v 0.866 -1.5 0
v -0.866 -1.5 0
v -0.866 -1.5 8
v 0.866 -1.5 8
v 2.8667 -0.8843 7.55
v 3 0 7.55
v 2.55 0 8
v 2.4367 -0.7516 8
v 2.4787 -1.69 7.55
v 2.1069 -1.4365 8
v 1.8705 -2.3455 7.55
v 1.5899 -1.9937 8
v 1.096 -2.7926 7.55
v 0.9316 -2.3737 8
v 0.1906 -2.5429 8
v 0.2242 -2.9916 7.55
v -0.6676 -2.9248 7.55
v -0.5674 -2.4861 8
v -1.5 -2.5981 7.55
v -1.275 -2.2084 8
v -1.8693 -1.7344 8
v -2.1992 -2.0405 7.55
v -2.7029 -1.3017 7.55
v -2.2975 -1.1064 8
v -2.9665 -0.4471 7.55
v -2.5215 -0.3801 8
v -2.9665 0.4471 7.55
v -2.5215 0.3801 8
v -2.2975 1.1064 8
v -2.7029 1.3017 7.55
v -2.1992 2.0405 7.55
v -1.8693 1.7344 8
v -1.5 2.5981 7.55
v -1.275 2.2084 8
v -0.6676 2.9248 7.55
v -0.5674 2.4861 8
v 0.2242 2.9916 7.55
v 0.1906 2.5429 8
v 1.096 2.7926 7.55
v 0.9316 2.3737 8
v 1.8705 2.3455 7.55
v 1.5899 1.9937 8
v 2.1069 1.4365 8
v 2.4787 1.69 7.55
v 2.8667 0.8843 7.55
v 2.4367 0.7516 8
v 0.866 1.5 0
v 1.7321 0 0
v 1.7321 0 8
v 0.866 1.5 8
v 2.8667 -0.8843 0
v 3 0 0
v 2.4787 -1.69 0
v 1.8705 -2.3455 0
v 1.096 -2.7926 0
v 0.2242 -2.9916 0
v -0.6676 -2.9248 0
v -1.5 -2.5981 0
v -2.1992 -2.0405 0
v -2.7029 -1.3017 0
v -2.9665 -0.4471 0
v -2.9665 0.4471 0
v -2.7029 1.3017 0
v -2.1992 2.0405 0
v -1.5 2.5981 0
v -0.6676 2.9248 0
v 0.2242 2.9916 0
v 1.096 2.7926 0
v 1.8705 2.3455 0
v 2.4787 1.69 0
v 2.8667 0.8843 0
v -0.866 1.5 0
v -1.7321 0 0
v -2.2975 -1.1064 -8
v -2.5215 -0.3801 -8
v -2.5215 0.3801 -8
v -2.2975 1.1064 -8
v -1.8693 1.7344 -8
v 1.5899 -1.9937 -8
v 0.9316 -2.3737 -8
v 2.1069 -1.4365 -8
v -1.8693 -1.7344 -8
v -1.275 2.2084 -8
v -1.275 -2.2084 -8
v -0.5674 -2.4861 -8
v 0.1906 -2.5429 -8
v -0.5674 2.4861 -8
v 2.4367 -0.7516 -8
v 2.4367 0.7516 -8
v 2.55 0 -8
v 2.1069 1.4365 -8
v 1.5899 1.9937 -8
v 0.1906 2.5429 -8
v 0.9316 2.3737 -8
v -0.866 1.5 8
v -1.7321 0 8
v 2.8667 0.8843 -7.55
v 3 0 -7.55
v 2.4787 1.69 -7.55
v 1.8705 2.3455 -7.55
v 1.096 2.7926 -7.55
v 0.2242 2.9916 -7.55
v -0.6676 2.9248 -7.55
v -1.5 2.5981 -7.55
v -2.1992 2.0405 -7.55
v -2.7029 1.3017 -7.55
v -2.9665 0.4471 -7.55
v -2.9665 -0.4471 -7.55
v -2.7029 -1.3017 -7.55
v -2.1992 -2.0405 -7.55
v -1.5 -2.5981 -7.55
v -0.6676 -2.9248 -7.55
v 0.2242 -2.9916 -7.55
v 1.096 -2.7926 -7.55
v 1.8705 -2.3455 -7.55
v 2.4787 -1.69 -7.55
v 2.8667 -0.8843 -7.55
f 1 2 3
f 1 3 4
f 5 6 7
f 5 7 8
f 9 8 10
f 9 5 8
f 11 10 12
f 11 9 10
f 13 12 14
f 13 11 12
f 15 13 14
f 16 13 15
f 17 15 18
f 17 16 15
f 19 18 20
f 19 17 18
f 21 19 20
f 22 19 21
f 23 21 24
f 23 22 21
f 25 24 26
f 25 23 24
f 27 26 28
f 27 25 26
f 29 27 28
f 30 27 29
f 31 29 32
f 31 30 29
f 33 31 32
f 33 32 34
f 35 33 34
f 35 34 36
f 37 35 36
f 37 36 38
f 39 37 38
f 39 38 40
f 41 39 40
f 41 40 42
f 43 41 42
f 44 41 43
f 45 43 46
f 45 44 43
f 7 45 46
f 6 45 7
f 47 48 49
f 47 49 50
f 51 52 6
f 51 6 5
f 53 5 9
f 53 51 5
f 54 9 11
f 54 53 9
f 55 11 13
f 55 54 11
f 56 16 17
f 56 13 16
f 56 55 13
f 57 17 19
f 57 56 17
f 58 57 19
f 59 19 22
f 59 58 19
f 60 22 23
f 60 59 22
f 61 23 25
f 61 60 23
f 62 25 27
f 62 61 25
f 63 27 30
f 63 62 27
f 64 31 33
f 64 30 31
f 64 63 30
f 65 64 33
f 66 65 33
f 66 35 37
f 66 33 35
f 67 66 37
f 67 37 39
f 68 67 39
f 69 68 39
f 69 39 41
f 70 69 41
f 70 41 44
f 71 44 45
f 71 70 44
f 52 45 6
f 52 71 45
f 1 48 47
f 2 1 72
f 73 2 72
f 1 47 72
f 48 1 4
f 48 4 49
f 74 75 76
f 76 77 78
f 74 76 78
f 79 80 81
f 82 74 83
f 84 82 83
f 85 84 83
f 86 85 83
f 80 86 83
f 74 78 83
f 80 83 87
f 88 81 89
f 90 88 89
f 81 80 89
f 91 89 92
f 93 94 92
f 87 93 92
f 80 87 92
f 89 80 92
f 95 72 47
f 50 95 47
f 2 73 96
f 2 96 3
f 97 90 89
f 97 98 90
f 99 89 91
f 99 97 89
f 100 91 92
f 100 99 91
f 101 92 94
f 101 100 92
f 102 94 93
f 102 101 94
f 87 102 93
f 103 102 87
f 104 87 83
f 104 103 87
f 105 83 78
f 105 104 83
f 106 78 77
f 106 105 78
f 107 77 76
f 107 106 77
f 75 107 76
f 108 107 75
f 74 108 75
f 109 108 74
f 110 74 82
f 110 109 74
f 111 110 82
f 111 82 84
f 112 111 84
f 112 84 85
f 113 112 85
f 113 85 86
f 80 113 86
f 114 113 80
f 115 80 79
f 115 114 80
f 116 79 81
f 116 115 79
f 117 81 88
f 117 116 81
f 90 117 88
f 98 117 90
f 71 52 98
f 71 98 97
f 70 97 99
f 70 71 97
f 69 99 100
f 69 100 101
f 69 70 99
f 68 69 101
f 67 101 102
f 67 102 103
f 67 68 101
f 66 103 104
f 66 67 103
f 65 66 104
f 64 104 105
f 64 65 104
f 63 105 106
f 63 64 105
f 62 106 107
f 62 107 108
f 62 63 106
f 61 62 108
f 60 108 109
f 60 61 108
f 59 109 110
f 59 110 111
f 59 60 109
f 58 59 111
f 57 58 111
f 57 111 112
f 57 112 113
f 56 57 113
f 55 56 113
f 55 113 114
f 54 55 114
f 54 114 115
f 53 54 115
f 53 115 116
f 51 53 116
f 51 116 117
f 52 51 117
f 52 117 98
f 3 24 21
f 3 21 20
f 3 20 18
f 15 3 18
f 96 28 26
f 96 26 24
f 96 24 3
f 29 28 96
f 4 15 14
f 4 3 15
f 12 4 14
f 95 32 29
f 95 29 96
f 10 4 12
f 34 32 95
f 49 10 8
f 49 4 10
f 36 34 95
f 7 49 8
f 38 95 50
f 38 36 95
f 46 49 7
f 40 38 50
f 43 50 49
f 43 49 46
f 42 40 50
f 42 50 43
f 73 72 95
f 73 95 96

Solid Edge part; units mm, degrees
sketch "Sketch1" plane through (0, 0, 0) normal (0, 0, 1) x (1, 0, 0)
  circle A0 centre (0, 0) radius 3
  dimension "D1" = 6
extrude "Protrusion1" add sketch "Sketch1" along normal mid plane 16
chamfer "Chamfer1" distance 0.45 angle 45 2 edges at (-3, 0, -8) (-3, 0, 8)
sketch "Sketch2" plane through (0, 0, 8) normal (0, 0, 1) x (1, 0, 0)
  line L0 (-0.866, 1.5) -> (0.866, 1.5)
  line L1 (1.7321, 0) -> (0.866, 1.5)
  line L2 (0.866, -1.5) -> (1.7321, 0)
  line L3 (-0.866, -1.5) -> (0.866, -1.5)
  line L4 (-1.7321, 0) -> (-0.866, -1.5)
  line L5 (-0.866, 1.5) -> (-1.7321, 0)
  dimension "D1" = 3
extrude "Cutout1" cut sketch "Sketch2" against normal blind 8
properties part number "24104725"
